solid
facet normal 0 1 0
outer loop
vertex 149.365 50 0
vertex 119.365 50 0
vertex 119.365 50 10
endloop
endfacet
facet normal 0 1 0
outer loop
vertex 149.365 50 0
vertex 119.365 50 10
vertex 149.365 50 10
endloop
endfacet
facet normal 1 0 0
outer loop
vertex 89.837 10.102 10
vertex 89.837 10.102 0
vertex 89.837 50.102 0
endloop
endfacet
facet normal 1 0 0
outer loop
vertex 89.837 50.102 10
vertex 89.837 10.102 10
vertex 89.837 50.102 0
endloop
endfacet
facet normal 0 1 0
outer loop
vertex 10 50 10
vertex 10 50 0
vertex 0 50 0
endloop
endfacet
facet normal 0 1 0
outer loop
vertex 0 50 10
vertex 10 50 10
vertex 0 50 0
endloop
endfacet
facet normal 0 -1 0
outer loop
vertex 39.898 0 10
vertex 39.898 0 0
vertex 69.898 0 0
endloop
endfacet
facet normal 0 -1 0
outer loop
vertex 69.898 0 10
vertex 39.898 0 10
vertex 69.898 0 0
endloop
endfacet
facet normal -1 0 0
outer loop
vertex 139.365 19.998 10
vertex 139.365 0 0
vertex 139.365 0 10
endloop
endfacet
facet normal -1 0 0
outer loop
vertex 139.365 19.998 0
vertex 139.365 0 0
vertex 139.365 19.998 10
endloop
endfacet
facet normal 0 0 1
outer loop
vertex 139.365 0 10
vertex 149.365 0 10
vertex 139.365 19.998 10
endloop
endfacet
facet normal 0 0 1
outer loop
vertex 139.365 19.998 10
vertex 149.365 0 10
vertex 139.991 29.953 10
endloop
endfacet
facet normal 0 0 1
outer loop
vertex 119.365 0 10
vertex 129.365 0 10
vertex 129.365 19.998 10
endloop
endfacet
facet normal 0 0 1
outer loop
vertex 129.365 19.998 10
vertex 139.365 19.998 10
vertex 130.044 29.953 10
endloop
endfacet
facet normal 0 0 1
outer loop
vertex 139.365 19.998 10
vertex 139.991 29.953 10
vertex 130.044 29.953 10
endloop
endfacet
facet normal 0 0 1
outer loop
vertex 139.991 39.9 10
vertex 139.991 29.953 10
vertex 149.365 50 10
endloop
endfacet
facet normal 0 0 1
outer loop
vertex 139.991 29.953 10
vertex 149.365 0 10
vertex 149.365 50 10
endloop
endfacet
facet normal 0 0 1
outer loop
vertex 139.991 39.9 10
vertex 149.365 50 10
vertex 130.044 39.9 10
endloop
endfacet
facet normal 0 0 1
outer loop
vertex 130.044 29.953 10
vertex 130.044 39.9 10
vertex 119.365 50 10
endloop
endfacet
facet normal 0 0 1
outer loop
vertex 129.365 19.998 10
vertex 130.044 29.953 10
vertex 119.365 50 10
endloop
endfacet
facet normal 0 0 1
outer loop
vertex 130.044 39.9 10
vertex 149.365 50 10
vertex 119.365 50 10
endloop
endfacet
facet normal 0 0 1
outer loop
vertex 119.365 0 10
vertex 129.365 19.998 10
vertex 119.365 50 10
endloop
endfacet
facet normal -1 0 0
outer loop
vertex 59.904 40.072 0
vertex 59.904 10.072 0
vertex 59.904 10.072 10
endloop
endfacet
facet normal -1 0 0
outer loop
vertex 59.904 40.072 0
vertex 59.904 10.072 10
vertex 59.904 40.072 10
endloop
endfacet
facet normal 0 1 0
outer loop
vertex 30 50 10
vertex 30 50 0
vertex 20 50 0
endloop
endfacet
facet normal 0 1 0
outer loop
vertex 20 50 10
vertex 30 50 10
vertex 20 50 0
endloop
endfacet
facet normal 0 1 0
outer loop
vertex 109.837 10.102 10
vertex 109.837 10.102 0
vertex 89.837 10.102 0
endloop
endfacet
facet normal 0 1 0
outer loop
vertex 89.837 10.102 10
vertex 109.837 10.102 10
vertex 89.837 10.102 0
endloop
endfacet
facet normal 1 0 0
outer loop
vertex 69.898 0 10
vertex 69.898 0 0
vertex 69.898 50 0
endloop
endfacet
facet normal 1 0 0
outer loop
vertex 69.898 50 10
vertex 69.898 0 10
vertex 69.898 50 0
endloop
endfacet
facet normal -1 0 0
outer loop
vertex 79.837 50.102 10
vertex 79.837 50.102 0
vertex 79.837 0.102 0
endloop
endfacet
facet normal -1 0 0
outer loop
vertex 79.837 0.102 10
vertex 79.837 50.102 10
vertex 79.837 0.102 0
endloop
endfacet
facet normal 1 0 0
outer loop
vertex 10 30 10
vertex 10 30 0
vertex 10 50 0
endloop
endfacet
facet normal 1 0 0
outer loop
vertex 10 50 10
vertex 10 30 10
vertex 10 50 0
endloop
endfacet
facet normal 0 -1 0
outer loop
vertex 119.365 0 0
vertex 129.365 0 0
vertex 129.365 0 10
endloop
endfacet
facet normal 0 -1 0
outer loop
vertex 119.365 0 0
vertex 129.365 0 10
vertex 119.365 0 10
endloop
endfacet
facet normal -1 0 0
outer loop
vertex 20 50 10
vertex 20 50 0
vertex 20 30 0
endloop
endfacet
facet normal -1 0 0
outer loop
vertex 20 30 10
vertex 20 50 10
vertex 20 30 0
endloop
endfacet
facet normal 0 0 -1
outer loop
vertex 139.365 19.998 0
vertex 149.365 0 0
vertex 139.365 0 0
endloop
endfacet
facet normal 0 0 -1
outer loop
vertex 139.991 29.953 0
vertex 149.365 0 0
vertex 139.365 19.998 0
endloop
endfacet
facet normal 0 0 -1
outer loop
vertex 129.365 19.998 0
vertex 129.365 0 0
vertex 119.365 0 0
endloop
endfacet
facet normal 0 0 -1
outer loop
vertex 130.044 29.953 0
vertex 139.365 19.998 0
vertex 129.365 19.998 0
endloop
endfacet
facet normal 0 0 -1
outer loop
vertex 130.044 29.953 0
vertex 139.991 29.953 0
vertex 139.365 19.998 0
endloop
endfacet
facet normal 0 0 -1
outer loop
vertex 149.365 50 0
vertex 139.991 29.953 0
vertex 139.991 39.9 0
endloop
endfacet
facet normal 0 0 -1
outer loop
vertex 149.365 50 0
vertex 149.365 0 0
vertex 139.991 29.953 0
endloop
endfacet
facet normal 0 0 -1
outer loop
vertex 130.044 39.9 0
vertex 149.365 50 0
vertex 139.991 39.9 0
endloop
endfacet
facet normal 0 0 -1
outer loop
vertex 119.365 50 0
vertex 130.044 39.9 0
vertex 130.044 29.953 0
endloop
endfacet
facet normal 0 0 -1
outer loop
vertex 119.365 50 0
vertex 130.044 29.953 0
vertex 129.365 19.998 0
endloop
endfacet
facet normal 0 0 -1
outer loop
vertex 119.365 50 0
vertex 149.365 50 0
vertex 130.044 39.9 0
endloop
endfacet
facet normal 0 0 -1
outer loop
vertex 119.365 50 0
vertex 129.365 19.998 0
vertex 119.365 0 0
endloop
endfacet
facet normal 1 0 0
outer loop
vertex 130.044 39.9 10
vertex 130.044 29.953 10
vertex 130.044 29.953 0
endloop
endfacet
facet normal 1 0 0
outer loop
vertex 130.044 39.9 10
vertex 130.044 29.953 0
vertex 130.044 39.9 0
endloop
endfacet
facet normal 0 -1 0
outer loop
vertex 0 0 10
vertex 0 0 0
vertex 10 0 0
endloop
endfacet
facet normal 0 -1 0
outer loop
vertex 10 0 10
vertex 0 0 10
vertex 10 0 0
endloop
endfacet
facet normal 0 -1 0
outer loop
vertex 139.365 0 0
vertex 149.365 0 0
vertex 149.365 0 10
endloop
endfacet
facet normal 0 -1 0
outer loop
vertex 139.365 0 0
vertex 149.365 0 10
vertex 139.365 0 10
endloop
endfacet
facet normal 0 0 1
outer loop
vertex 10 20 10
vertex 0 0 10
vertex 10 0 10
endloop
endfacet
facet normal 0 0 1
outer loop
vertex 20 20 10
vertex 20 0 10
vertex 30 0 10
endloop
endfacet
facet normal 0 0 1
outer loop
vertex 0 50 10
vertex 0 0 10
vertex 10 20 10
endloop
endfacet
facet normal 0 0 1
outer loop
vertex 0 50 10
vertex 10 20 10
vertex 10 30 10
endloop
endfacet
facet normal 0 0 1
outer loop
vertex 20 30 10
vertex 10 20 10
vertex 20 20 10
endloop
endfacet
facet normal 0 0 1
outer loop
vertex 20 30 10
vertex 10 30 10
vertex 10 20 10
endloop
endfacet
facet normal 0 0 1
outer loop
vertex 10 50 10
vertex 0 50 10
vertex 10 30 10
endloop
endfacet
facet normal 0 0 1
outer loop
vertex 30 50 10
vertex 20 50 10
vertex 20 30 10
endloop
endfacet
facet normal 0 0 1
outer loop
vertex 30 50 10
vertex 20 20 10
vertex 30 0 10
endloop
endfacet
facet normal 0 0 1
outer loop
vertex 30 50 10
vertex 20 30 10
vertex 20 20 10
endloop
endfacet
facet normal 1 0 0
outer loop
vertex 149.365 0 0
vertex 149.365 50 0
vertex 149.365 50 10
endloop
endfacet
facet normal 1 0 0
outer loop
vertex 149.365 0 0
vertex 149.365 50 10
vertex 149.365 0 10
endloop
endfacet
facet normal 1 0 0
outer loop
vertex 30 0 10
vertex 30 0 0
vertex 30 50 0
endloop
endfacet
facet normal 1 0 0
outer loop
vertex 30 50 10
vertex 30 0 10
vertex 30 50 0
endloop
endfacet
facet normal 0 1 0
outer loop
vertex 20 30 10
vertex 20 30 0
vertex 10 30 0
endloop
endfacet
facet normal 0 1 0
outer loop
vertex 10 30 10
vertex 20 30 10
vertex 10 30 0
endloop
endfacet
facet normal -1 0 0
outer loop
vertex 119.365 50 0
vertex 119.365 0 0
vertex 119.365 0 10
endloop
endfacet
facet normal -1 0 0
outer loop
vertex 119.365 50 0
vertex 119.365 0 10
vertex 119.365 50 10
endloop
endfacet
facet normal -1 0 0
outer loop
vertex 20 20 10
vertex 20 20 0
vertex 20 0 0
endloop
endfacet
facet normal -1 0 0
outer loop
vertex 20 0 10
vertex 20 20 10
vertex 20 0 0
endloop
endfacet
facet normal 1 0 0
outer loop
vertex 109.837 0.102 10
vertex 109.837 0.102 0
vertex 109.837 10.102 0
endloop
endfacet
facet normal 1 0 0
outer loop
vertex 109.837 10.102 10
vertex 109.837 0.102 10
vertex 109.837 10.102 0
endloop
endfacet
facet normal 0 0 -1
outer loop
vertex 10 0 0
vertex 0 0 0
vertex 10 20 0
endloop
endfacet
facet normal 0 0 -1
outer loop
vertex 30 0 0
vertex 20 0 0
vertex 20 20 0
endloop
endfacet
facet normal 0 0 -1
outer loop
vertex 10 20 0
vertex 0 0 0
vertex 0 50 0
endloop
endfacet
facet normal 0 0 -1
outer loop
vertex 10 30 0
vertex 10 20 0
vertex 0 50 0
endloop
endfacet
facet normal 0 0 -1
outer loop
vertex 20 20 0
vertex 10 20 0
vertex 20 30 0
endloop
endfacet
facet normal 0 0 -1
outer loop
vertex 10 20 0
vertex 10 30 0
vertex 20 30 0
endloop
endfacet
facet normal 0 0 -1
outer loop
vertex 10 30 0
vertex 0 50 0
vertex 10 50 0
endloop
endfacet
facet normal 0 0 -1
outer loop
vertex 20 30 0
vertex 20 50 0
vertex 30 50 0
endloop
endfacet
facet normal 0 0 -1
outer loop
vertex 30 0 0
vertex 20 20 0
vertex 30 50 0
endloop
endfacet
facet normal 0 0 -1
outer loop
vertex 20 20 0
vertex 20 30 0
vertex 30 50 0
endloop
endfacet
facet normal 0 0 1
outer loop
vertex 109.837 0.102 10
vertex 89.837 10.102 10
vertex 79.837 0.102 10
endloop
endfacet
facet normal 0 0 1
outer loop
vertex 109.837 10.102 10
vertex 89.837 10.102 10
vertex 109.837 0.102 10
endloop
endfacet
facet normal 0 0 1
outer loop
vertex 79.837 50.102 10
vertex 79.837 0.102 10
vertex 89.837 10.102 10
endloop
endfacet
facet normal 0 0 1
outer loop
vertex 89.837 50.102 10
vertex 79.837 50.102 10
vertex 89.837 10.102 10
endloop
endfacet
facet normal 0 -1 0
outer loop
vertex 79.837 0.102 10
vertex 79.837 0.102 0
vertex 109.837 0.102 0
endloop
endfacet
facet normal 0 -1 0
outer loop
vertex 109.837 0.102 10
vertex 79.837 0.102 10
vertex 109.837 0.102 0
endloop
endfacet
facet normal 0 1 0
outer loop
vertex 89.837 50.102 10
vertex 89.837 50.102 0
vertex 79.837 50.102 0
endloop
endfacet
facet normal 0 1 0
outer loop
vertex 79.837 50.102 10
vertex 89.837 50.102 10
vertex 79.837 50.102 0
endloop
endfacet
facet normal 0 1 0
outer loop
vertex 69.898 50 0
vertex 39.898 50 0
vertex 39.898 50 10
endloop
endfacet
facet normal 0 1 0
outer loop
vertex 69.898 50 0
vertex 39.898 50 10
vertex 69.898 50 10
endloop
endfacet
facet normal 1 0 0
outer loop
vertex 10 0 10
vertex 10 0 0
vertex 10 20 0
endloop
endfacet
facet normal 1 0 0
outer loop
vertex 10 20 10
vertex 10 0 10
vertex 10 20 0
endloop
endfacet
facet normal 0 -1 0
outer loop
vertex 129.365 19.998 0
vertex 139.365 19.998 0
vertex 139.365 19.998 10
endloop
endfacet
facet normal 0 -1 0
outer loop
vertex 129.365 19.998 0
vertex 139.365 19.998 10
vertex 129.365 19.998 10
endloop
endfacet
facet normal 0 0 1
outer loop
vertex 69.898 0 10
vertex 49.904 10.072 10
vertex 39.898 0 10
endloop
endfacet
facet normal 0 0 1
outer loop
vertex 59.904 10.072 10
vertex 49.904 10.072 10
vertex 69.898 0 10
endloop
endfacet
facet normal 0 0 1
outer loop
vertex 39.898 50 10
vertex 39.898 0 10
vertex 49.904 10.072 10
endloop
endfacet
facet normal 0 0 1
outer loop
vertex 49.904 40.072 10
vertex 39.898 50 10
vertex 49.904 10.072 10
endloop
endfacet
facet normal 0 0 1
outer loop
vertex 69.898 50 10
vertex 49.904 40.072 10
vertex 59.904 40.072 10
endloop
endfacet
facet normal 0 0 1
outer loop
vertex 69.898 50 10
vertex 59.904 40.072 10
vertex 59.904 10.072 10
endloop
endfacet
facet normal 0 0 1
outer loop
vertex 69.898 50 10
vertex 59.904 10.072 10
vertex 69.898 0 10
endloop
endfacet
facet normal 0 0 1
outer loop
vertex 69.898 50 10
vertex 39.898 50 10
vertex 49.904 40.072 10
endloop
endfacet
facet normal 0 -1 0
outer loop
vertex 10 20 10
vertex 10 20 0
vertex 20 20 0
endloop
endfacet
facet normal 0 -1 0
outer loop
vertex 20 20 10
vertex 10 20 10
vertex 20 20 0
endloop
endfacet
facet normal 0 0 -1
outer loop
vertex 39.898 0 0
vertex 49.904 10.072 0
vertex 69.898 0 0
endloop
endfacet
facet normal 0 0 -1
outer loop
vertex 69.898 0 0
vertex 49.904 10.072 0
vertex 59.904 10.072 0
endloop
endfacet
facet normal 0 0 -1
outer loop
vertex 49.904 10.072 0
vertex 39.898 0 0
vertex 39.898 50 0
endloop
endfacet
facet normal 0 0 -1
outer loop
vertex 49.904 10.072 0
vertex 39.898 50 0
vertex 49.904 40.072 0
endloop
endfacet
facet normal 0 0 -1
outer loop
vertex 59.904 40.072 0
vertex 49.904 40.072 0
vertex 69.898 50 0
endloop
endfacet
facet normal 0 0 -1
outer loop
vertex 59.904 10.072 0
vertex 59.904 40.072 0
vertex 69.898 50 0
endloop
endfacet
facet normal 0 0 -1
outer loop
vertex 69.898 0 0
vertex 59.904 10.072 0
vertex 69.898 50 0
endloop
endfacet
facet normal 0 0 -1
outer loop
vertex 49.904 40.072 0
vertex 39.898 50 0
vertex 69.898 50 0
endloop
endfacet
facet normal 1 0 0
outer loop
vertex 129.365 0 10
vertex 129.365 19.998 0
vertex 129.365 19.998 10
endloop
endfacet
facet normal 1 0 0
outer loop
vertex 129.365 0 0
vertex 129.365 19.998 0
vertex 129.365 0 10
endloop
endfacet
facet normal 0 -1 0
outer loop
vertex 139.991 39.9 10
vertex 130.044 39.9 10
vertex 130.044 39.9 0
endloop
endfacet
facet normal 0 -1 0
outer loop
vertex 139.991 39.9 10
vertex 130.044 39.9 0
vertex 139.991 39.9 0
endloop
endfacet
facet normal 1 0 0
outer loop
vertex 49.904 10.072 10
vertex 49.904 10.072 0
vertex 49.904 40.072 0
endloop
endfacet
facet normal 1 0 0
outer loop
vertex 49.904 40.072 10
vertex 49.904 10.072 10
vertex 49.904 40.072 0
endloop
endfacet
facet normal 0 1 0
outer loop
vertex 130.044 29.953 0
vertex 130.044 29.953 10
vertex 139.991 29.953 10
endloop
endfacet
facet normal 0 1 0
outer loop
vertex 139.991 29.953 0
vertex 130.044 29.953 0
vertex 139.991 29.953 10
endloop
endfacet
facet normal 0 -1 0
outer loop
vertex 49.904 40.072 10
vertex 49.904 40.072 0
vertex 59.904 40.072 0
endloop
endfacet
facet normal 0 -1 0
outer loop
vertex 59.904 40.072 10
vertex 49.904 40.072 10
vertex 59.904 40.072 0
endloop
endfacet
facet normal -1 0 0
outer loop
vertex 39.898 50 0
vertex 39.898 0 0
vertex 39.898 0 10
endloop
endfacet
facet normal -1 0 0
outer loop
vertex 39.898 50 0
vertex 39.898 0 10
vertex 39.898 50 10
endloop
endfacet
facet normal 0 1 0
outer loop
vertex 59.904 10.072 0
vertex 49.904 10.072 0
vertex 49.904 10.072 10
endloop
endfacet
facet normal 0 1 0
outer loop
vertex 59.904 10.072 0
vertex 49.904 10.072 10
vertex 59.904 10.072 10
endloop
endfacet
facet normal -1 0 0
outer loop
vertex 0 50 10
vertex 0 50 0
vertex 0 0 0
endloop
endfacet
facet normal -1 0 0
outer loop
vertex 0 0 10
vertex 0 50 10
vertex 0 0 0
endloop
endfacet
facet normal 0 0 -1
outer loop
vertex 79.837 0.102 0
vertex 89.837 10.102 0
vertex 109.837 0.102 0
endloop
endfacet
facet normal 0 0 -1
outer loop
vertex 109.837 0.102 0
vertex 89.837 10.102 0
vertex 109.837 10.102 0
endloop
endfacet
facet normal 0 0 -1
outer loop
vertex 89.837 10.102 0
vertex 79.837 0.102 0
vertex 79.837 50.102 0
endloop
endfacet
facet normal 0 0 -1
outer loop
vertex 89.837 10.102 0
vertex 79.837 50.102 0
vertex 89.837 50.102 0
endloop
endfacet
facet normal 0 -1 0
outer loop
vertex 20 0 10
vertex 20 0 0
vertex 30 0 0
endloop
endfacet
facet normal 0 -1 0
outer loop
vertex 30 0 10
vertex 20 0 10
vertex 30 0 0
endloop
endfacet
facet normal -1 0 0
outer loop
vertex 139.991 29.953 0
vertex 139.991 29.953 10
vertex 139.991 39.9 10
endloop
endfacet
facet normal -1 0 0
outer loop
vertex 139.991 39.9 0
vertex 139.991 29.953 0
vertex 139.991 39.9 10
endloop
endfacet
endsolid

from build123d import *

# Parameters (mm, degrees)
PAD001_DEPTH  = 10
SKETCH005_W   = 30
SKETCH005_H   = 50
SKETCH005_W_2 = 10
SKETCH005_H_2 = 30
PAD_DEPTH     = 10
PAD002_DEPTH  = 10
SKETCH012_W   = 9.946716
SKETCH012_H   = 9.946716
PAD003_DEPTH  = 10


with BuildPart() as body:
    # Sketch → Pad001 (new body)
    with BuildSketch(Plane.XY):
        Polygon((0, 50), (0, 0), (10, 0), (10, 20), (20, 20), (20, 0), (30, 0), (30, 50), (20, 50), (20, 30), (10, 30), (10, 50), align=None)
    extrude(amount=PAD001_DEPTH)


with BuildPart() as body001:
    # Sketch005 → Pad (new body)
    with BuildSketch(Plane.XY):
        with Locations((54.898264, 25)):
            Rectangle(SKETCH005_W, SKETCH005_H)
        with Locations((54.903865, 25.072376)):
            Rectangle(SKETCH005_W_2, SKETCH005_H_2, mode=Mode.SUBTRACT)
    extrude(amount=PAD_DEPTH)


with BuildPart() as body002:
    # Sketch008 → Pad002 (new body)
    with BuildSketch(Plane.XY):
        Polygon((79.836866, 50.101835), (79.836866, 0.101835), (109.836866, 0.101835), (109.836866, 10.101835), (89.836866, 10.101835), (89.836866, 50.101835), align=None)
    extrude(amount=PAD002_DEPTH)


with BuildPart() as body003:
    # Sketch012 → Pad003 (new body)
    with BuildSketch(Plane.XY):
        Polygon((119.364758, 0), (119.364758, 50), (149.364758, 50), (149.364758, 0), (139.364758, 0), (139.364758, 19.99831), (129.364758, 19.99831), (129.364758, 0), align=None)
        with Locations((135.017212, 34.926586)):
            Rectangle(SKETCH012_W, SKETCH012_H, mode=Mode.SUBTRACT)
    extrude(amount=PAD003_DEPTH)


solid = Compound([body.part, body001.part, body002.part, body003.part])
